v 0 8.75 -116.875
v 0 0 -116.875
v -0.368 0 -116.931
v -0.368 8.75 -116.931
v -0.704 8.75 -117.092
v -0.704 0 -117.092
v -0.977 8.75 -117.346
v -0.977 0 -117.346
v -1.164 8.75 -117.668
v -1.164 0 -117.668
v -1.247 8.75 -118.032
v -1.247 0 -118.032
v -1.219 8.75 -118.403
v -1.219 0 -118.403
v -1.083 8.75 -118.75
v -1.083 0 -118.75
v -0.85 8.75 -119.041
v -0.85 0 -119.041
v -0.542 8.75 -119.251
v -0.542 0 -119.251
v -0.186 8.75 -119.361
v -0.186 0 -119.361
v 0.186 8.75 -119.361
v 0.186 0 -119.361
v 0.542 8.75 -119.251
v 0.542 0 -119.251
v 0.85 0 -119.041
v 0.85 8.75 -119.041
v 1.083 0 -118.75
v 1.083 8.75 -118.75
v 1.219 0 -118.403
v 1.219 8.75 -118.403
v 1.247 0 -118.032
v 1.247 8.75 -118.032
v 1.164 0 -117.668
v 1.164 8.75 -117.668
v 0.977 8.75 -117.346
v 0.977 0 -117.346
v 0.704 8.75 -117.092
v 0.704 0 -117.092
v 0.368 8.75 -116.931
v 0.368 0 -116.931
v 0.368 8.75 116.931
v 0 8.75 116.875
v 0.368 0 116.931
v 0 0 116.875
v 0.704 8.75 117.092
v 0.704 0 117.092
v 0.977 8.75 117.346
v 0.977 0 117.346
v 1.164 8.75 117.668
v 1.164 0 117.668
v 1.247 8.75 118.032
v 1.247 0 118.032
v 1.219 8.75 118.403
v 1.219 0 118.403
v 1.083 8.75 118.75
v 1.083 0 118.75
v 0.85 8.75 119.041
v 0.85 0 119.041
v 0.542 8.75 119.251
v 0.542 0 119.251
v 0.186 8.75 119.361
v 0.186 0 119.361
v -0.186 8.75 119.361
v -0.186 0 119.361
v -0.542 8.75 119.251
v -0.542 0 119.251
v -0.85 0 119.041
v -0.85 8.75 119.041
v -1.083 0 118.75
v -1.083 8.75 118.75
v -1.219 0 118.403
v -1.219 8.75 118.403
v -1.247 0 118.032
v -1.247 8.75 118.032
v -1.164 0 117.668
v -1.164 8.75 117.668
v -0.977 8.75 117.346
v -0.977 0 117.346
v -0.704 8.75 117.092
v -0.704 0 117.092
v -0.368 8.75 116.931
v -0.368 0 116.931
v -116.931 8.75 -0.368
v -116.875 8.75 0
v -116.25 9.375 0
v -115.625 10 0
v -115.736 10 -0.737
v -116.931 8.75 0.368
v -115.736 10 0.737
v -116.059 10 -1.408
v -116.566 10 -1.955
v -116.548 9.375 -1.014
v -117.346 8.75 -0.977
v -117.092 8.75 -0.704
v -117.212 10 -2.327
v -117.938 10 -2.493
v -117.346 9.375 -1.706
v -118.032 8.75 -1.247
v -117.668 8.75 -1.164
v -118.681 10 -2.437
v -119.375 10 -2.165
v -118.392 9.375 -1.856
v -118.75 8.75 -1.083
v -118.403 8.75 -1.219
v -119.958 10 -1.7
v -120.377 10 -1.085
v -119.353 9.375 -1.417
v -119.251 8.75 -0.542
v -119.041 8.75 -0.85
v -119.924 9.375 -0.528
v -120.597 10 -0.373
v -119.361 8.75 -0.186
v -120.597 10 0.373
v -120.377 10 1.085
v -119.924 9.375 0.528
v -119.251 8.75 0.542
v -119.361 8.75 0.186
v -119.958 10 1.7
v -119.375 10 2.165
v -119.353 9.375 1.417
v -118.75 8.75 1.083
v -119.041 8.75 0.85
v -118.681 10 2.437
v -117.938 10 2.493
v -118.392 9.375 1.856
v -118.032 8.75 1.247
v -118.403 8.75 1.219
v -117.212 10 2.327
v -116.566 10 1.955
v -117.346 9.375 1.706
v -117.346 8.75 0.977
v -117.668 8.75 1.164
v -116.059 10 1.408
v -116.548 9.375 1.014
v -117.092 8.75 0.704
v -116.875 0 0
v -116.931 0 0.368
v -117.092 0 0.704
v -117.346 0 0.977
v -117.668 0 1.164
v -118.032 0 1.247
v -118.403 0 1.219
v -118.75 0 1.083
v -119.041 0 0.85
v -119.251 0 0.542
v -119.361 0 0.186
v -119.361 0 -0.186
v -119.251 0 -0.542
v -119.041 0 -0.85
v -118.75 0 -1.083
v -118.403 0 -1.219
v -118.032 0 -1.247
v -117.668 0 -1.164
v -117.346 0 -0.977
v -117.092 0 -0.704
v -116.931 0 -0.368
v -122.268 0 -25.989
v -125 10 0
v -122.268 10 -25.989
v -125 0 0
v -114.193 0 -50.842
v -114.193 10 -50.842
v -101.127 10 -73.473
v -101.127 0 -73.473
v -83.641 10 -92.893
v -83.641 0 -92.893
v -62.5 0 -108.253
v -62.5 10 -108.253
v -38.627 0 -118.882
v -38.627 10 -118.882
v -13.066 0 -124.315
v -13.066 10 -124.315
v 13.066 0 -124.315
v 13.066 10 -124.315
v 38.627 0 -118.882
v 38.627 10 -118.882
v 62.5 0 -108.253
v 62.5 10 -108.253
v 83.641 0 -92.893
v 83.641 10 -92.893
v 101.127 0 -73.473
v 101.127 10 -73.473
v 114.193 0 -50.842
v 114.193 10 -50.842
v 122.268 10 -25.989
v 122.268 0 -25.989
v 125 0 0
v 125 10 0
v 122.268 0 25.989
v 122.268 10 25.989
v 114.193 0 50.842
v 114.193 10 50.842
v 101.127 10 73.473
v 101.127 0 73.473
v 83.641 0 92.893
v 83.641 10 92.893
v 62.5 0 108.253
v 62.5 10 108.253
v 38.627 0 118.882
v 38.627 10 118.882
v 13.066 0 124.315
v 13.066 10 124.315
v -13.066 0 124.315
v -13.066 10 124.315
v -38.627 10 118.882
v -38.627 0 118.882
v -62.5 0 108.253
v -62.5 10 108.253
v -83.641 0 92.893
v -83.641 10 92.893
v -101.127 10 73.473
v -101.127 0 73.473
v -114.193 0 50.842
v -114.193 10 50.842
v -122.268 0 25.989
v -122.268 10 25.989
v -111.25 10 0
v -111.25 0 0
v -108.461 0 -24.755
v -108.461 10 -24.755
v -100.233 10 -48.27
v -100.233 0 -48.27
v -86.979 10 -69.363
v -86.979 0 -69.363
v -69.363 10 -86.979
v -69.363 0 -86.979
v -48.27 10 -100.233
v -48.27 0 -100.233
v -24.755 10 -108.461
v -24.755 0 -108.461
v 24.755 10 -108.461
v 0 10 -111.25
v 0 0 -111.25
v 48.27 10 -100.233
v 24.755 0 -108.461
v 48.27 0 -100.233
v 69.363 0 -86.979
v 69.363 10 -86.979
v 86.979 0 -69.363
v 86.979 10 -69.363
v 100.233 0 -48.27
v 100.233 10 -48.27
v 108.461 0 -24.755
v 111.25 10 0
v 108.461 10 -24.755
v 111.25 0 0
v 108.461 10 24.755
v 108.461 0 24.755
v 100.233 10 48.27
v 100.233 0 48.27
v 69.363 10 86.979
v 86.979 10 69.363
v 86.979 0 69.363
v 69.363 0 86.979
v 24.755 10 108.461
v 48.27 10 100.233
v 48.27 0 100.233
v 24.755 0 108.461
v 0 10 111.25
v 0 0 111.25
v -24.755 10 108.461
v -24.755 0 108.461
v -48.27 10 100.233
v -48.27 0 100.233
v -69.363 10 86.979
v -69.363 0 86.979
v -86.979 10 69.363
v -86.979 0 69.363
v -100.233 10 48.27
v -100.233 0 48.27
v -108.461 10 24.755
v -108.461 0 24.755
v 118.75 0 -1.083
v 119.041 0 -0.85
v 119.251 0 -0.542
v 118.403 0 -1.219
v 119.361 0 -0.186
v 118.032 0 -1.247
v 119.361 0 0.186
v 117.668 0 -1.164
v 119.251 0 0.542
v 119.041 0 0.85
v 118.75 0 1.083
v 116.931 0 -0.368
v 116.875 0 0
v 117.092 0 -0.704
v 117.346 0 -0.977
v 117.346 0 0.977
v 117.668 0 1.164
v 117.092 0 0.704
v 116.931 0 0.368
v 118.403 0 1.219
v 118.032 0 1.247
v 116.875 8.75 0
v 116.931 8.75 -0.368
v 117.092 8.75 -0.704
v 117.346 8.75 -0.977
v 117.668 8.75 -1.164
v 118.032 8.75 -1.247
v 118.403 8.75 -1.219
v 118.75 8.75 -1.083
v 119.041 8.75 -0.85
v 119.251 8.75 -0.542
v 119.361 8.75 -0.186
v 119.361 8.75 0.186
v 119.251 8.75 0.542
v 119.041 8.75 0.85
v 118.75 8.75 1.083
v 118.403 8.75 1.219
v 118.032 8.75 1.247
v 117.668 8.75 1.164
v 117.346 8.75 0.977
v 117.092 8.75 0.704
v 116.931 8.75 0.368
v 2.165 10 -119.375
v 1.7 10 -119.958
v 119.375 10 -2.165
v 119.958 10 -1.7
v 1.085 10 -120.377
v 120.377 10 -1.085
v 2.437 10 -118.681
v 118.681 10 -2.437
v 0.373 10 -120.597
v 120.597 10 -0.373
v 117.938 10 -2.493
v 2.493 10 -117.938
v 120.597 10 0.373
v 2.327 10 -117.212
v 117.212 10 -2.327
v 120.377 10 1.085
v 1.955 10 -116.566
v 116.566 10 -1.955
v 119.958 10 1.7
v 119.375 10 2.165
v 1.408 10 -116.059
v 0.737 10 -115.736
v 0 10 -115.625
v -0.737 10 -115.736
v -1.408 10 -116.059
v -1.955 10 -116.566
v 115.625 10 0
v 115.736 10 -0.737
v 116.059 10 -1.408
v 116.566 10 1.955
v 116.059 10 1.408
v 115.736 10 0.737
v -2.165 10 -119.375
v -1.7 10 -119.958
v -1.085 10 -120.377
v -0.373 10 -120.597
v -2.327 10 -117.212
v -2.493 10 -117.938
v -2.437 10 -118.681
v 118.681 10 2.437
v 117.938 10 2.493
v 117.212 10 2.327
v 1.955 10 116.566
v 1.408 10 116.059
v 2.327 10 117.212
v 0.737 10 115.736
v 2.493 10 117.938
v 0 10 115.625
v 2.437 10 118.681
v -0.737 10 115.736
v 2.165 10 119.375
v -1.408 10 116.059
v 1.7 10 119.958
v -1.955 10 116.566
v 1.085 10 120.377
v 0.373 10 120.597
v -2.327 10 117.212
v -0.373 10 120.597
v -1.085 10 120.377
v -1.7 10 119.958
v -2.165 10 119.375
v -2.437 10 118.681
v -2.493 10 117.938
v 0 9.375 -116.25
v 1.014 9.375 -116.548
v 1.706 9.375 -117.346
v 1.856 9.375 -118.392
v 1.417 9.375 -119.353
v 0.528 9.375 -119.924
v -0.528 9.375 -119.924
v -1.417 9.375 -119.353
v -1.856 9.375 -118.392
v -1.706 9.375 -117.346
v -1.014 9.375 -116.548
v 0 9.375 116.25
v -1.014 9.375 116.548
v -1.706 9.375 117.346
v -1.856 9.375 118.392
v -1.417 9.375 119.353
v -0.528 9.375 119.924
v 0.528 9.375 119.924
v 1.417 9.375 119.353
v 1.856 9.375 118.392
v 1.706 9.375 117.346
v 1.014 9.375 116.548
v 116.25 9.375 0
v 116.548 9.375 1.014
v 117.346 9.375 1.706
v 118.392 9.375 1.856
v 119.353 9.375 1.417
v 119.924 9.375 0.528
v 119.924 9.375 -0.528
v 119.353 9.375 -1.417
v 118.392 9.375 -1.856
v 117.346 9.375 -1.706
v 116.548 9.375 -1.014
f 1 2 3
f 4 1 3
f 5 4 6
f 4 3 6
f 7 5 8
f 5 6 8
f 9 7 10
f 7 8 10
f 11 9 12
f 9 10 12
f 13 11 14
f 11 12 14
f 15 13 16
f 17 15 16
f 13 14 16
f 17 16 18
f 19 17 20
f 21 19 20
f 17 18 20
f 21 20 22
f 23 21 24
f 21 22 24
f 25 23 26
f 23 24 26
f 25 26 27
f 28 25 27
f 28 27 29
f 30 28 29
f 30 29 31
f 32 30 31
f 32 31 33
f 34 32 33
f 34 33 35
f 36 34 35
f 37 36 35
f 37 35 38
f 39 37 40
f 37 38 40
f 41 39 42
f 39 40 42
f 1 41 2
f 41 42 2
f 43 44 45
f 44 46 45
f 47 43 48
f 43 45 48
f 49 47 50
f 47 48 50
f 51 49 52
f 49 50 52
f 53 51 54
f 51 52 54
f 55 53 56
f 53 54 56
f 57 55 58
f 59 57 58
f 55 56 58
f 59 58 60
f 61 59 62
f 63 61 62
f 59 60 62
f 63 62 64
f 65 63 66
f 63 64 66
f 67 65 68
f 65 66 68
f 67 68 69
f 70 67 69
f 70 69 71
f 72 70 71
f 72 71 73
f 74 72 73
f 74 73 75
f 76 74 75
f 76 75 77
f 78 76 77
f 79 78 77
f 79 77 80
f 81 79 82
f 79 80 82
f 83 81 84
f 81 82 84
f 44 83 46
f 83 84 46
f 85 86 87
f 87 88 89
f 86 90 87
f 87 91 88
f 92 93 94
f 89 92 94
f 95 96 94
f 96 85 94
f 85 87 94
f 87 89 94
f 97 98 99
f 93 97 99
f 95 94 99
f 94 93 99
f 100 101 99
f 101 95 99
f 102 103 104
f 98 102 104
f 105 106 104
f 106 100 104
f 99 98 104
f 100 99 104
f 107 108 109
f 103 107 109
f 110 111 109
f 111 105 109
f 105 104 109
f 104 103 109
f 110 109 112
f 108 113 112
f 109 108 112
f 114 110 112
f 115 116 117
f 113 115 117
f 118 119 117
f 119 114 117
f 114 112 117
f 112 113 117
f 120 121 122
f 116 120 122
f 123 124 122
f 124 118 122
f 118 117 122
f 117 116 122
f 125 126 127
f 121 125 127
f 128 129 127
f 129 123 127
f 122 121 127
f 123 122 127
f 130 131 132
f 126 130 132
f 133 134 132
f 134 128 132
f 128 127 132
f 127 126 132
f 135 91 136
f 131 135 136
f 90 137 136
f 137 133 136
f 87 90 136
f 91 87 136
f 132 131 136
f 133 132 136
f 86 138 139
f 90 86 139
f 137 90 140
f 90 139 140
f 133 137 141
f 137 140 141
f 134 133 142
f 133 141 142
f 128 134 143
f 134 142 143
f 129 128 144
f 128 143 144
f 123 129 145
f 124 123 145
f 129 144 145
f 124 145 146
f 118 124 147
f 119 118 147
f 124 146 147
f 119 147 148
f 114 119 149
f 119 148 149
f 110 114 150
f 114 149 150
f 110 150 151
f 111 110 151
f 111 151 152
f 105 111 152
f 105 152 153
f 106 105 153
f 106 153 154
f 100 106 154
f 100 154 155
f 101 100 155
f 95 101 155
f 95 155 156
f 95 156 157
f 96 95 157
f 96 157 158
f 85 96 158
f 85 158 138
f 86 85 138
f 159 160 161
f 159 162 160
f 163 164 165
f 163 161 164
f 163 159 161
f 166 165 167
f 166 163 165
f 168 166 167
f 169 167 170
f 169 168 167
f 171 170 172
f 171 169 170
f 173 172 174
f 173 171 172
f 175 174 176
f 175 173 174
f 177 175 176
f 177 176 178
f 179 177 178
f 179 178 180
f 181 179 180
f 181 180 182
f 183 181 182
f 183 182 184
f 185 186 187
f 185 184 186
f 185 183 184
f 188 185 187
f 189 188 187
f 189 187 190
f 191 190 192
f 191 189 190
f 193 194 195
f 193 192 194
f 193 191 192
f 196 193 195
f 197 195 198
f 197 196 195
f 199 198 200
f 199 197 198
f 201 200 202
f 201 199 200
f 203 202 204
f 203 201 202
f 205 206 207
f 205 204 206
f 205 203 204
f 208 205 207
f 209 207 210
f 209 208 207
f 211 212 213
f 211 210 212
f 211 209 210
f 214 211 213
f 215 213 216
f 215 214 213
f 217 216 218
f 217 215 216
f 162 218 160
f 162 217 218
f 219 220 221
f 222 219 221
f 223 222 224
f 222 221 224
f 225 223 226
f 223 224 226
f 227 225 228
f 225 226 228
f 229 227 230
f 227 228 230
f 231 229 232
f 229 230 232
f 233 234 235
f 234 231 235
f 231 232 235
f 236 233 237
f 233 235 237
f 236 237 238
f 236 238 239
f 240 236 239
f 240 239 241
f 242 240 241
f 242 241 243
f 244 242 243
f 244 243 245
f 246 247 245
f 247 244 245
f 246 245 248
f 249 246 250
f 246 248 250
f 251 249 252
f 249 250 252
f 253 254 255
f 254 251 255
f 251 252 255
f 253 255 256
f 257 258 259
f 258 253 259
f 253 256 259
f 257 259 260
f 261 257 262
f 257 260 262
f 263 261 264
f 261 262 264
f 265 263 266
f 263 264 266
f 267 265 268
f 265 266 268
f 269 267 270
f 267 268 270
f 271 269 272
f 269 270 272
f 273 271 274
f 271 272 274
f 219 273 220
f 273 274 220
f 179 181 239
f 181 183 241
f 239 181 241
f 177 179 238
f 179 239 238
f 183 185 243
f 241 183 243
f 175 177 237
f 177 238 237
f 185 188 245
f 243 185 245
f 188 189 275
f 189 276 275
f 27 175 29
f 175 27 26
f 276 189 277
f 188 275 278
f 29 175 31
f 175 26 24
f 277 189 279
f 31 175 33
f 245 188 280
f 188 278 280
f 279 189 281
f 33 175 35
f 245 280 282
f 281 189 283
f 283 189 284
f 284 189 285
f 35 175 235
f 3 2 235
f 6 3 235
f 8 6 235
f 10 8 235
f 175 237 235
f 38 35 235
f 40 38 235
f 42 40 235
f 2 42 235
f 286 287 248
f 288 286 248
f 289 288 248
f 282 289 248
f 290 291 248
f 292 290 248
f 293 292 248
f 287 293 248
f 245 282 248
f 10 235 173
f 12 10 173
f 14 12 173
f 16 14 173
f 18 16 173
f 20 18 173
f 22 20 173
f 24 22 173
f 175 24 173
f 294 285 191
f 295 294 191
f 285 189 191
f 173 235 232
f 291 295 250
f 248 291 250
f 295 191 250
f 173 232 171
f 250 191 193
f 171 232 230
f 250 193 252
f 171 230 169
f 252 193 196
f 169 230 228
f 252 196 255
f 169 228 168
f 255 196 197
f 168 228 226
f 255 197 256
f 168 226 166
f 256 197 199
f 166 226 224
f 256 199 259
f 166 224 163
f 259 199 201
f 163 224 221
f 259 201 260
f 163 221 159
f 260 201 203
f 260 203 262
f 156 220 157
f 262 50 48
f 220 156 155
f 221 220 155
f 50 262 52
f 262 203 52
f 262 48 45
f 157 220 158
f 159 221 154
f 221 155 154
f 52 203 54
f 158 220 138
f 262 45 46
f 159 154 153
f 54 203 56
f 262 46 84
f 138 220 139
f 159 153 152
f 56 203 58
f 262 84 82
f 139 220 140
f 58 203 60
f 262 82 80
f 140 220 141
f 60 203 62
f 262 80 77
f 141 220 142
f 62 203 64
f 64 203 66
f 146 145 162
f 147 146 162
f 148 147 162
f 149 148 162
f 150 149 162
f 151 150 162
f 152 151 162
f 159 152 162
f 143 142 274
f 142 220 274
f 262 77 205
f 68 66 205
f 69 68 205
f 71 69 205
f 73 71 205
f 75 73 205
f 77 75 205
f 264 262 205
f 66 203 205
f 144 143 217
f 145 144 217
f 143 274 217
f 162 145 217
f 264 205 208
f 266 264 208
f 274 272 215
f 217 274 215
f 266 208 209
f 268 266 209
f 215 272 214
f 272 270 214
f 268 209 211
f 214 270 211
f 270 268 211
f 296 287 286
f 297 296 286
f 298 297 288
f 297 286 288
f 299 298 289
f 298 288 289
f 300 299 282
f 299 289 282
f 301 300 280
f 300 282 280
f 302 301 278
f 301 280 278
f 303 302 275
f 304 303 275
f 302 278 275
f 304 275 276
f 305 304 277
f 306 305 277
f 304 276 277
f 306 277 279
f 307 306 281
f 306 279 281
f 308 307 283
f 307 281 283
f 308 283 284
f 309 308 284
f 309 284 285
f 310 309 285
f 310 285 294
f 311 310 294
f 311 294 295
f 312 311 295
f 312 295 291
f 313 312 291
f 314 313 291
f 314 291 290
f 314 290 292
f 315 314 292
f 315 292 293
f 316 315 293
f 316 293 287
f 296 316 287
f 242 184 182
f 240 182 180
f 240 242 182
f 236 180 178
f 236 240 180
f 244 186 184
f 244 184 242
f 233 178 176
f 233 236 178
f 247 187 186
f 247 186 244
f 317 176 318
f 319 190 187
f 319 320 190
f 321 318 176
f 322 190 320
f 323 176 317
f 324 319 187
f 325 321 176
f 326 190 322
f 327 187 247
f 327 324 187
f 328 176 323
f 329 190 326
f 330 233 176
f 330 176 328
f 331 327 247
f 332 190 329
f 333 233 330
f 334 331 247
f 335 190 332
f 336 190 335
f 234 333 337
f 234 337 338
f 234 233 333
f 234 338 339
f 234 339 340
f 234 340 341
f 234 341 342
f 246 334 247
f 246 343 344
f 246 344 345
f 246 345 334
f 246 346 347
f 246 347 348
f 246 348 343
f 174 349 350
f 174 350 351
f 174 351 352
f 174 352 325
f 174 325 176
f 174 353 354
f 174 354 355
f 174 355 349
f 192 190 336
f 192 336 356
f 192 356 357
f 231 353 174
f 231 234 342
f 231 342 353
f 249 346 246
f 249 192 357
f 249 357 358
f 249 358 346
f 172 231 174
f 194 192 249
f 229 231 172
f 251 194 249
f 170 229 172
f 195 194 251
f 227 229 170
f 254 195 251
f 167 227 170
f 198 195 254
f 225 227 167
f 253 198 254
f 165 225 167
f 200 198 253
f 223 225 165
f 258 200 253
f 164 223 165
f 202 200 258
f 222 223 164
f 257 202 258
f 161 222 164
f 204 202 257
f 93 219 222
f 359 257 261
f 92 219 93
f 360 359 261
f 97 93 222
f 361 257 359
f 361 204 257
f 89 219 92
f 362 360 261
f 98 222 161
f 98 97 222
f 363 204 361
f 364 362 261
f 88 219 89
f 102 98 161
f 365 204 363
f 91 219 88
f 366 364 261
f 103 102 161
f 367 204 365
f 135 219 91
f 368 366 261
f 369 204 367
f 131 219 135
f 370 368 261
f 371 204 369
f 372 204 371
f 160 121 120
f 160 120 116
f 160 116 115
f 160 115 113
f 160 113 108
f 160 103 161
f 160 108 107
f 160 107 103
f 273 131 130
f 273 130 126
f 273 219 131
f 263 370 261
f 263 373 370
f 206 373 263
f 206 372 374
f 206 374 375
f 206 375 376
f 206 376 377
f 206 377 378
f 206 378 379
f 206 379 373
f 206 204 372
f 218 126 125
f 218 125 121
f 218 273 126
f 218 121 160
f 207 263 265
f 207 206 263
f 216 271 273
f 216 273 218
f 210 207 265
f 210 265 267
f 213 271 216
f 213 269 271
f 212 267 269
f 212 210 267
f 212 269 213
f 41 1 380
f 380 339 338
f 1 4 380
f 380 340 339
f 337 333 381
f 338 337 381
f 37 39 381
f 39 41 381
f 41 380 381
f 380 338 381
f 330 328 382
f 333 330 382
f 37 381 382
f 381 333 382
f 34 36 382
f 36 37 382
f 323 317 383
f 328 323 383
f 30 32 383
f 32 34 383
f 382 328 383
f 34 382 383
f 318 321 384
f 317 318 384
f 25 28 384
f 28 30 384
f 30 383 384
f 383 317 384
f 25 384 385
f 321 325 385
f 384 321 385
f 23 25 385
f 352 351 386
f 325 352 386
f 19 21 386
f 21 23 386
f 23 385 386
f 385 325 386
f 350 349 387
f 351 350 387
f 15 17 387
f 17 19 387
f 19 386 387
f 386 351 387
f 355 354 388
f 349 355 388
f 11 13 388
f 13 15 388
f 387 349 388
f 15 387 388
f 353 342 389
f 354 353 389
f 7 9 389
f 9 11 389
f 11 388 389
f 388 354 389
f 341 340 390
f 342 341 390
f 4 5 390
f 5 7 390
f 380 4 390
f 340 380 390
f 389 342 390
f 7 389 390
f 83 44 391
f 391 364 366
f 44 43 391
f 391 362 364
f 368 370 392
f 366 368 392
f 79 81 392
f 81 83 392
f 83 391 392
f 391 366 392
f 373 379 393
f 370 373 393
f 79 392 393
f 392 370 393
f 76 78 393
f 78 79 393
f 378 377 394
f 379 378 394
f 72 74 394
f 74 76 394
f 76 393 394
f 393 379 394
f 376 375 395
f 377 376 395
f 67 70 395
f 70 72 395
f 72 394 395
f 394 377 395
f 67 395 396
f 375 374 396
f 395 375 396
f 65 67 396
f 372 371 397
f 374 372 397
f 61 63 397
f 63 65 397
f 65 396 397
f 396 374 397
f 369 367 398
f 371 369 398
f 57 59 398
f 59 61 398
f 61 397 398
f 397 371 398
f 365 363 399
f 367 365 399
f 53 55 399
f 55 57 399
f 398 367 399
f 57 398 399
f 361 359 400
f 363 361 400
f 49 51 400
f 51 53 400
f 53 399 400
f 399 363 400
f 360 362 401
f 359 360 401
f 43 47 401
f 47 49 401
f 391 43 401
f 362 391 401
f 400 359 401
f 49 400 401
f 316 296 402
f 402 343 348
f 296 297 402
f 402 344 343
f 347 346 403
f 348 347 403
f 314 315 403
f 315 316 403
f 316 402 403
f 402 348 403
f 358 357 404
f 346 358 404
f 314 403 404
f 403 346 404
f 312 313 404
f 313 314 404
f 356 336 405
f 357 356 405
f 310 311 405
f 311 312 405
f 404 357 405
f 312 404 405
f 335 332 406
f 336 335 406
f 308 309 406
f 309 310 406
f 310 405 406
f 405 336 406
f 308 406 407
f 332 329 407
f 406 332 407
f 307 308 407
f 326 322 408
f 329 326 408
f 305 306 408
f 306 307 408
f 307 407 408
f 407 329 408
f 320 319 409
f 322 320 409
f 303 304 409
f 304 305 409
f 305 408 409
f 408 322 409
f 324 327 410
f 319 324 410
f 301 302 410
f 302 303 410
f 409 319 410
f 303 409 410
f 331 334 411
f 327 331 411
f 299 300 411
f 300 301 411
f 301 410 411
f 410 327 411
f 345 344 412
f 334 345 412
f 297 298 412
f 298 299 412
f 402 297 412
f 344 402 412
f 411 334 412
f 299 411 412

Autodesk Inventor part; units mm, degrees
ref_plane "YZ Plane" through (0, 0, 0) normal (1, 0, 0) x (0, 1, 0)
ref_plane "XZ Plane" through (0, 0, 0) normal (0, 1, 0) x (-1, 0, 0)
ref_plane "XY Plane" through (0, 0, 0) normal (0, 0, 1) x (1, 0, 0)
sketch "Sketch1" plane through (0, 0, 0) normal (0, 1, 0) x (-1, 0, 0)
  circle A0 centre (0, 0) radius 125
  circle A1 centre (0, 0) radius 111.25
  dimension "d0" = 250
  dimension "d1" = 222.5
extrude "Extrusion1" add sketch "Sketch1" along normal blind 10
sketch "Sketch2" plane through (0, 10, 0) normal (0, 1, 0) x (1, 0, 0)
  circle A0 centre (0, 0) radius 118.125
  point P0 (0, 118.125)
  dimension "d4" = 236.25
hole "Hole1" at (0, 10, -118.125) direction (0, -1, 0) diameter 2.5 end through all countersink diameter 5 countersink angle 90
pattern_circular "Circular Pattern1" count 4 over 360 about axis through (0, -10, 0) along (0, 1, 0) of "Hole1"
sketch "Sketch3" plane through (0, 10, 0) normal (0, 1, 0) x (1, 0, 0)
  point P0 (0, 0)
properties part number "OuterBearingTable"
